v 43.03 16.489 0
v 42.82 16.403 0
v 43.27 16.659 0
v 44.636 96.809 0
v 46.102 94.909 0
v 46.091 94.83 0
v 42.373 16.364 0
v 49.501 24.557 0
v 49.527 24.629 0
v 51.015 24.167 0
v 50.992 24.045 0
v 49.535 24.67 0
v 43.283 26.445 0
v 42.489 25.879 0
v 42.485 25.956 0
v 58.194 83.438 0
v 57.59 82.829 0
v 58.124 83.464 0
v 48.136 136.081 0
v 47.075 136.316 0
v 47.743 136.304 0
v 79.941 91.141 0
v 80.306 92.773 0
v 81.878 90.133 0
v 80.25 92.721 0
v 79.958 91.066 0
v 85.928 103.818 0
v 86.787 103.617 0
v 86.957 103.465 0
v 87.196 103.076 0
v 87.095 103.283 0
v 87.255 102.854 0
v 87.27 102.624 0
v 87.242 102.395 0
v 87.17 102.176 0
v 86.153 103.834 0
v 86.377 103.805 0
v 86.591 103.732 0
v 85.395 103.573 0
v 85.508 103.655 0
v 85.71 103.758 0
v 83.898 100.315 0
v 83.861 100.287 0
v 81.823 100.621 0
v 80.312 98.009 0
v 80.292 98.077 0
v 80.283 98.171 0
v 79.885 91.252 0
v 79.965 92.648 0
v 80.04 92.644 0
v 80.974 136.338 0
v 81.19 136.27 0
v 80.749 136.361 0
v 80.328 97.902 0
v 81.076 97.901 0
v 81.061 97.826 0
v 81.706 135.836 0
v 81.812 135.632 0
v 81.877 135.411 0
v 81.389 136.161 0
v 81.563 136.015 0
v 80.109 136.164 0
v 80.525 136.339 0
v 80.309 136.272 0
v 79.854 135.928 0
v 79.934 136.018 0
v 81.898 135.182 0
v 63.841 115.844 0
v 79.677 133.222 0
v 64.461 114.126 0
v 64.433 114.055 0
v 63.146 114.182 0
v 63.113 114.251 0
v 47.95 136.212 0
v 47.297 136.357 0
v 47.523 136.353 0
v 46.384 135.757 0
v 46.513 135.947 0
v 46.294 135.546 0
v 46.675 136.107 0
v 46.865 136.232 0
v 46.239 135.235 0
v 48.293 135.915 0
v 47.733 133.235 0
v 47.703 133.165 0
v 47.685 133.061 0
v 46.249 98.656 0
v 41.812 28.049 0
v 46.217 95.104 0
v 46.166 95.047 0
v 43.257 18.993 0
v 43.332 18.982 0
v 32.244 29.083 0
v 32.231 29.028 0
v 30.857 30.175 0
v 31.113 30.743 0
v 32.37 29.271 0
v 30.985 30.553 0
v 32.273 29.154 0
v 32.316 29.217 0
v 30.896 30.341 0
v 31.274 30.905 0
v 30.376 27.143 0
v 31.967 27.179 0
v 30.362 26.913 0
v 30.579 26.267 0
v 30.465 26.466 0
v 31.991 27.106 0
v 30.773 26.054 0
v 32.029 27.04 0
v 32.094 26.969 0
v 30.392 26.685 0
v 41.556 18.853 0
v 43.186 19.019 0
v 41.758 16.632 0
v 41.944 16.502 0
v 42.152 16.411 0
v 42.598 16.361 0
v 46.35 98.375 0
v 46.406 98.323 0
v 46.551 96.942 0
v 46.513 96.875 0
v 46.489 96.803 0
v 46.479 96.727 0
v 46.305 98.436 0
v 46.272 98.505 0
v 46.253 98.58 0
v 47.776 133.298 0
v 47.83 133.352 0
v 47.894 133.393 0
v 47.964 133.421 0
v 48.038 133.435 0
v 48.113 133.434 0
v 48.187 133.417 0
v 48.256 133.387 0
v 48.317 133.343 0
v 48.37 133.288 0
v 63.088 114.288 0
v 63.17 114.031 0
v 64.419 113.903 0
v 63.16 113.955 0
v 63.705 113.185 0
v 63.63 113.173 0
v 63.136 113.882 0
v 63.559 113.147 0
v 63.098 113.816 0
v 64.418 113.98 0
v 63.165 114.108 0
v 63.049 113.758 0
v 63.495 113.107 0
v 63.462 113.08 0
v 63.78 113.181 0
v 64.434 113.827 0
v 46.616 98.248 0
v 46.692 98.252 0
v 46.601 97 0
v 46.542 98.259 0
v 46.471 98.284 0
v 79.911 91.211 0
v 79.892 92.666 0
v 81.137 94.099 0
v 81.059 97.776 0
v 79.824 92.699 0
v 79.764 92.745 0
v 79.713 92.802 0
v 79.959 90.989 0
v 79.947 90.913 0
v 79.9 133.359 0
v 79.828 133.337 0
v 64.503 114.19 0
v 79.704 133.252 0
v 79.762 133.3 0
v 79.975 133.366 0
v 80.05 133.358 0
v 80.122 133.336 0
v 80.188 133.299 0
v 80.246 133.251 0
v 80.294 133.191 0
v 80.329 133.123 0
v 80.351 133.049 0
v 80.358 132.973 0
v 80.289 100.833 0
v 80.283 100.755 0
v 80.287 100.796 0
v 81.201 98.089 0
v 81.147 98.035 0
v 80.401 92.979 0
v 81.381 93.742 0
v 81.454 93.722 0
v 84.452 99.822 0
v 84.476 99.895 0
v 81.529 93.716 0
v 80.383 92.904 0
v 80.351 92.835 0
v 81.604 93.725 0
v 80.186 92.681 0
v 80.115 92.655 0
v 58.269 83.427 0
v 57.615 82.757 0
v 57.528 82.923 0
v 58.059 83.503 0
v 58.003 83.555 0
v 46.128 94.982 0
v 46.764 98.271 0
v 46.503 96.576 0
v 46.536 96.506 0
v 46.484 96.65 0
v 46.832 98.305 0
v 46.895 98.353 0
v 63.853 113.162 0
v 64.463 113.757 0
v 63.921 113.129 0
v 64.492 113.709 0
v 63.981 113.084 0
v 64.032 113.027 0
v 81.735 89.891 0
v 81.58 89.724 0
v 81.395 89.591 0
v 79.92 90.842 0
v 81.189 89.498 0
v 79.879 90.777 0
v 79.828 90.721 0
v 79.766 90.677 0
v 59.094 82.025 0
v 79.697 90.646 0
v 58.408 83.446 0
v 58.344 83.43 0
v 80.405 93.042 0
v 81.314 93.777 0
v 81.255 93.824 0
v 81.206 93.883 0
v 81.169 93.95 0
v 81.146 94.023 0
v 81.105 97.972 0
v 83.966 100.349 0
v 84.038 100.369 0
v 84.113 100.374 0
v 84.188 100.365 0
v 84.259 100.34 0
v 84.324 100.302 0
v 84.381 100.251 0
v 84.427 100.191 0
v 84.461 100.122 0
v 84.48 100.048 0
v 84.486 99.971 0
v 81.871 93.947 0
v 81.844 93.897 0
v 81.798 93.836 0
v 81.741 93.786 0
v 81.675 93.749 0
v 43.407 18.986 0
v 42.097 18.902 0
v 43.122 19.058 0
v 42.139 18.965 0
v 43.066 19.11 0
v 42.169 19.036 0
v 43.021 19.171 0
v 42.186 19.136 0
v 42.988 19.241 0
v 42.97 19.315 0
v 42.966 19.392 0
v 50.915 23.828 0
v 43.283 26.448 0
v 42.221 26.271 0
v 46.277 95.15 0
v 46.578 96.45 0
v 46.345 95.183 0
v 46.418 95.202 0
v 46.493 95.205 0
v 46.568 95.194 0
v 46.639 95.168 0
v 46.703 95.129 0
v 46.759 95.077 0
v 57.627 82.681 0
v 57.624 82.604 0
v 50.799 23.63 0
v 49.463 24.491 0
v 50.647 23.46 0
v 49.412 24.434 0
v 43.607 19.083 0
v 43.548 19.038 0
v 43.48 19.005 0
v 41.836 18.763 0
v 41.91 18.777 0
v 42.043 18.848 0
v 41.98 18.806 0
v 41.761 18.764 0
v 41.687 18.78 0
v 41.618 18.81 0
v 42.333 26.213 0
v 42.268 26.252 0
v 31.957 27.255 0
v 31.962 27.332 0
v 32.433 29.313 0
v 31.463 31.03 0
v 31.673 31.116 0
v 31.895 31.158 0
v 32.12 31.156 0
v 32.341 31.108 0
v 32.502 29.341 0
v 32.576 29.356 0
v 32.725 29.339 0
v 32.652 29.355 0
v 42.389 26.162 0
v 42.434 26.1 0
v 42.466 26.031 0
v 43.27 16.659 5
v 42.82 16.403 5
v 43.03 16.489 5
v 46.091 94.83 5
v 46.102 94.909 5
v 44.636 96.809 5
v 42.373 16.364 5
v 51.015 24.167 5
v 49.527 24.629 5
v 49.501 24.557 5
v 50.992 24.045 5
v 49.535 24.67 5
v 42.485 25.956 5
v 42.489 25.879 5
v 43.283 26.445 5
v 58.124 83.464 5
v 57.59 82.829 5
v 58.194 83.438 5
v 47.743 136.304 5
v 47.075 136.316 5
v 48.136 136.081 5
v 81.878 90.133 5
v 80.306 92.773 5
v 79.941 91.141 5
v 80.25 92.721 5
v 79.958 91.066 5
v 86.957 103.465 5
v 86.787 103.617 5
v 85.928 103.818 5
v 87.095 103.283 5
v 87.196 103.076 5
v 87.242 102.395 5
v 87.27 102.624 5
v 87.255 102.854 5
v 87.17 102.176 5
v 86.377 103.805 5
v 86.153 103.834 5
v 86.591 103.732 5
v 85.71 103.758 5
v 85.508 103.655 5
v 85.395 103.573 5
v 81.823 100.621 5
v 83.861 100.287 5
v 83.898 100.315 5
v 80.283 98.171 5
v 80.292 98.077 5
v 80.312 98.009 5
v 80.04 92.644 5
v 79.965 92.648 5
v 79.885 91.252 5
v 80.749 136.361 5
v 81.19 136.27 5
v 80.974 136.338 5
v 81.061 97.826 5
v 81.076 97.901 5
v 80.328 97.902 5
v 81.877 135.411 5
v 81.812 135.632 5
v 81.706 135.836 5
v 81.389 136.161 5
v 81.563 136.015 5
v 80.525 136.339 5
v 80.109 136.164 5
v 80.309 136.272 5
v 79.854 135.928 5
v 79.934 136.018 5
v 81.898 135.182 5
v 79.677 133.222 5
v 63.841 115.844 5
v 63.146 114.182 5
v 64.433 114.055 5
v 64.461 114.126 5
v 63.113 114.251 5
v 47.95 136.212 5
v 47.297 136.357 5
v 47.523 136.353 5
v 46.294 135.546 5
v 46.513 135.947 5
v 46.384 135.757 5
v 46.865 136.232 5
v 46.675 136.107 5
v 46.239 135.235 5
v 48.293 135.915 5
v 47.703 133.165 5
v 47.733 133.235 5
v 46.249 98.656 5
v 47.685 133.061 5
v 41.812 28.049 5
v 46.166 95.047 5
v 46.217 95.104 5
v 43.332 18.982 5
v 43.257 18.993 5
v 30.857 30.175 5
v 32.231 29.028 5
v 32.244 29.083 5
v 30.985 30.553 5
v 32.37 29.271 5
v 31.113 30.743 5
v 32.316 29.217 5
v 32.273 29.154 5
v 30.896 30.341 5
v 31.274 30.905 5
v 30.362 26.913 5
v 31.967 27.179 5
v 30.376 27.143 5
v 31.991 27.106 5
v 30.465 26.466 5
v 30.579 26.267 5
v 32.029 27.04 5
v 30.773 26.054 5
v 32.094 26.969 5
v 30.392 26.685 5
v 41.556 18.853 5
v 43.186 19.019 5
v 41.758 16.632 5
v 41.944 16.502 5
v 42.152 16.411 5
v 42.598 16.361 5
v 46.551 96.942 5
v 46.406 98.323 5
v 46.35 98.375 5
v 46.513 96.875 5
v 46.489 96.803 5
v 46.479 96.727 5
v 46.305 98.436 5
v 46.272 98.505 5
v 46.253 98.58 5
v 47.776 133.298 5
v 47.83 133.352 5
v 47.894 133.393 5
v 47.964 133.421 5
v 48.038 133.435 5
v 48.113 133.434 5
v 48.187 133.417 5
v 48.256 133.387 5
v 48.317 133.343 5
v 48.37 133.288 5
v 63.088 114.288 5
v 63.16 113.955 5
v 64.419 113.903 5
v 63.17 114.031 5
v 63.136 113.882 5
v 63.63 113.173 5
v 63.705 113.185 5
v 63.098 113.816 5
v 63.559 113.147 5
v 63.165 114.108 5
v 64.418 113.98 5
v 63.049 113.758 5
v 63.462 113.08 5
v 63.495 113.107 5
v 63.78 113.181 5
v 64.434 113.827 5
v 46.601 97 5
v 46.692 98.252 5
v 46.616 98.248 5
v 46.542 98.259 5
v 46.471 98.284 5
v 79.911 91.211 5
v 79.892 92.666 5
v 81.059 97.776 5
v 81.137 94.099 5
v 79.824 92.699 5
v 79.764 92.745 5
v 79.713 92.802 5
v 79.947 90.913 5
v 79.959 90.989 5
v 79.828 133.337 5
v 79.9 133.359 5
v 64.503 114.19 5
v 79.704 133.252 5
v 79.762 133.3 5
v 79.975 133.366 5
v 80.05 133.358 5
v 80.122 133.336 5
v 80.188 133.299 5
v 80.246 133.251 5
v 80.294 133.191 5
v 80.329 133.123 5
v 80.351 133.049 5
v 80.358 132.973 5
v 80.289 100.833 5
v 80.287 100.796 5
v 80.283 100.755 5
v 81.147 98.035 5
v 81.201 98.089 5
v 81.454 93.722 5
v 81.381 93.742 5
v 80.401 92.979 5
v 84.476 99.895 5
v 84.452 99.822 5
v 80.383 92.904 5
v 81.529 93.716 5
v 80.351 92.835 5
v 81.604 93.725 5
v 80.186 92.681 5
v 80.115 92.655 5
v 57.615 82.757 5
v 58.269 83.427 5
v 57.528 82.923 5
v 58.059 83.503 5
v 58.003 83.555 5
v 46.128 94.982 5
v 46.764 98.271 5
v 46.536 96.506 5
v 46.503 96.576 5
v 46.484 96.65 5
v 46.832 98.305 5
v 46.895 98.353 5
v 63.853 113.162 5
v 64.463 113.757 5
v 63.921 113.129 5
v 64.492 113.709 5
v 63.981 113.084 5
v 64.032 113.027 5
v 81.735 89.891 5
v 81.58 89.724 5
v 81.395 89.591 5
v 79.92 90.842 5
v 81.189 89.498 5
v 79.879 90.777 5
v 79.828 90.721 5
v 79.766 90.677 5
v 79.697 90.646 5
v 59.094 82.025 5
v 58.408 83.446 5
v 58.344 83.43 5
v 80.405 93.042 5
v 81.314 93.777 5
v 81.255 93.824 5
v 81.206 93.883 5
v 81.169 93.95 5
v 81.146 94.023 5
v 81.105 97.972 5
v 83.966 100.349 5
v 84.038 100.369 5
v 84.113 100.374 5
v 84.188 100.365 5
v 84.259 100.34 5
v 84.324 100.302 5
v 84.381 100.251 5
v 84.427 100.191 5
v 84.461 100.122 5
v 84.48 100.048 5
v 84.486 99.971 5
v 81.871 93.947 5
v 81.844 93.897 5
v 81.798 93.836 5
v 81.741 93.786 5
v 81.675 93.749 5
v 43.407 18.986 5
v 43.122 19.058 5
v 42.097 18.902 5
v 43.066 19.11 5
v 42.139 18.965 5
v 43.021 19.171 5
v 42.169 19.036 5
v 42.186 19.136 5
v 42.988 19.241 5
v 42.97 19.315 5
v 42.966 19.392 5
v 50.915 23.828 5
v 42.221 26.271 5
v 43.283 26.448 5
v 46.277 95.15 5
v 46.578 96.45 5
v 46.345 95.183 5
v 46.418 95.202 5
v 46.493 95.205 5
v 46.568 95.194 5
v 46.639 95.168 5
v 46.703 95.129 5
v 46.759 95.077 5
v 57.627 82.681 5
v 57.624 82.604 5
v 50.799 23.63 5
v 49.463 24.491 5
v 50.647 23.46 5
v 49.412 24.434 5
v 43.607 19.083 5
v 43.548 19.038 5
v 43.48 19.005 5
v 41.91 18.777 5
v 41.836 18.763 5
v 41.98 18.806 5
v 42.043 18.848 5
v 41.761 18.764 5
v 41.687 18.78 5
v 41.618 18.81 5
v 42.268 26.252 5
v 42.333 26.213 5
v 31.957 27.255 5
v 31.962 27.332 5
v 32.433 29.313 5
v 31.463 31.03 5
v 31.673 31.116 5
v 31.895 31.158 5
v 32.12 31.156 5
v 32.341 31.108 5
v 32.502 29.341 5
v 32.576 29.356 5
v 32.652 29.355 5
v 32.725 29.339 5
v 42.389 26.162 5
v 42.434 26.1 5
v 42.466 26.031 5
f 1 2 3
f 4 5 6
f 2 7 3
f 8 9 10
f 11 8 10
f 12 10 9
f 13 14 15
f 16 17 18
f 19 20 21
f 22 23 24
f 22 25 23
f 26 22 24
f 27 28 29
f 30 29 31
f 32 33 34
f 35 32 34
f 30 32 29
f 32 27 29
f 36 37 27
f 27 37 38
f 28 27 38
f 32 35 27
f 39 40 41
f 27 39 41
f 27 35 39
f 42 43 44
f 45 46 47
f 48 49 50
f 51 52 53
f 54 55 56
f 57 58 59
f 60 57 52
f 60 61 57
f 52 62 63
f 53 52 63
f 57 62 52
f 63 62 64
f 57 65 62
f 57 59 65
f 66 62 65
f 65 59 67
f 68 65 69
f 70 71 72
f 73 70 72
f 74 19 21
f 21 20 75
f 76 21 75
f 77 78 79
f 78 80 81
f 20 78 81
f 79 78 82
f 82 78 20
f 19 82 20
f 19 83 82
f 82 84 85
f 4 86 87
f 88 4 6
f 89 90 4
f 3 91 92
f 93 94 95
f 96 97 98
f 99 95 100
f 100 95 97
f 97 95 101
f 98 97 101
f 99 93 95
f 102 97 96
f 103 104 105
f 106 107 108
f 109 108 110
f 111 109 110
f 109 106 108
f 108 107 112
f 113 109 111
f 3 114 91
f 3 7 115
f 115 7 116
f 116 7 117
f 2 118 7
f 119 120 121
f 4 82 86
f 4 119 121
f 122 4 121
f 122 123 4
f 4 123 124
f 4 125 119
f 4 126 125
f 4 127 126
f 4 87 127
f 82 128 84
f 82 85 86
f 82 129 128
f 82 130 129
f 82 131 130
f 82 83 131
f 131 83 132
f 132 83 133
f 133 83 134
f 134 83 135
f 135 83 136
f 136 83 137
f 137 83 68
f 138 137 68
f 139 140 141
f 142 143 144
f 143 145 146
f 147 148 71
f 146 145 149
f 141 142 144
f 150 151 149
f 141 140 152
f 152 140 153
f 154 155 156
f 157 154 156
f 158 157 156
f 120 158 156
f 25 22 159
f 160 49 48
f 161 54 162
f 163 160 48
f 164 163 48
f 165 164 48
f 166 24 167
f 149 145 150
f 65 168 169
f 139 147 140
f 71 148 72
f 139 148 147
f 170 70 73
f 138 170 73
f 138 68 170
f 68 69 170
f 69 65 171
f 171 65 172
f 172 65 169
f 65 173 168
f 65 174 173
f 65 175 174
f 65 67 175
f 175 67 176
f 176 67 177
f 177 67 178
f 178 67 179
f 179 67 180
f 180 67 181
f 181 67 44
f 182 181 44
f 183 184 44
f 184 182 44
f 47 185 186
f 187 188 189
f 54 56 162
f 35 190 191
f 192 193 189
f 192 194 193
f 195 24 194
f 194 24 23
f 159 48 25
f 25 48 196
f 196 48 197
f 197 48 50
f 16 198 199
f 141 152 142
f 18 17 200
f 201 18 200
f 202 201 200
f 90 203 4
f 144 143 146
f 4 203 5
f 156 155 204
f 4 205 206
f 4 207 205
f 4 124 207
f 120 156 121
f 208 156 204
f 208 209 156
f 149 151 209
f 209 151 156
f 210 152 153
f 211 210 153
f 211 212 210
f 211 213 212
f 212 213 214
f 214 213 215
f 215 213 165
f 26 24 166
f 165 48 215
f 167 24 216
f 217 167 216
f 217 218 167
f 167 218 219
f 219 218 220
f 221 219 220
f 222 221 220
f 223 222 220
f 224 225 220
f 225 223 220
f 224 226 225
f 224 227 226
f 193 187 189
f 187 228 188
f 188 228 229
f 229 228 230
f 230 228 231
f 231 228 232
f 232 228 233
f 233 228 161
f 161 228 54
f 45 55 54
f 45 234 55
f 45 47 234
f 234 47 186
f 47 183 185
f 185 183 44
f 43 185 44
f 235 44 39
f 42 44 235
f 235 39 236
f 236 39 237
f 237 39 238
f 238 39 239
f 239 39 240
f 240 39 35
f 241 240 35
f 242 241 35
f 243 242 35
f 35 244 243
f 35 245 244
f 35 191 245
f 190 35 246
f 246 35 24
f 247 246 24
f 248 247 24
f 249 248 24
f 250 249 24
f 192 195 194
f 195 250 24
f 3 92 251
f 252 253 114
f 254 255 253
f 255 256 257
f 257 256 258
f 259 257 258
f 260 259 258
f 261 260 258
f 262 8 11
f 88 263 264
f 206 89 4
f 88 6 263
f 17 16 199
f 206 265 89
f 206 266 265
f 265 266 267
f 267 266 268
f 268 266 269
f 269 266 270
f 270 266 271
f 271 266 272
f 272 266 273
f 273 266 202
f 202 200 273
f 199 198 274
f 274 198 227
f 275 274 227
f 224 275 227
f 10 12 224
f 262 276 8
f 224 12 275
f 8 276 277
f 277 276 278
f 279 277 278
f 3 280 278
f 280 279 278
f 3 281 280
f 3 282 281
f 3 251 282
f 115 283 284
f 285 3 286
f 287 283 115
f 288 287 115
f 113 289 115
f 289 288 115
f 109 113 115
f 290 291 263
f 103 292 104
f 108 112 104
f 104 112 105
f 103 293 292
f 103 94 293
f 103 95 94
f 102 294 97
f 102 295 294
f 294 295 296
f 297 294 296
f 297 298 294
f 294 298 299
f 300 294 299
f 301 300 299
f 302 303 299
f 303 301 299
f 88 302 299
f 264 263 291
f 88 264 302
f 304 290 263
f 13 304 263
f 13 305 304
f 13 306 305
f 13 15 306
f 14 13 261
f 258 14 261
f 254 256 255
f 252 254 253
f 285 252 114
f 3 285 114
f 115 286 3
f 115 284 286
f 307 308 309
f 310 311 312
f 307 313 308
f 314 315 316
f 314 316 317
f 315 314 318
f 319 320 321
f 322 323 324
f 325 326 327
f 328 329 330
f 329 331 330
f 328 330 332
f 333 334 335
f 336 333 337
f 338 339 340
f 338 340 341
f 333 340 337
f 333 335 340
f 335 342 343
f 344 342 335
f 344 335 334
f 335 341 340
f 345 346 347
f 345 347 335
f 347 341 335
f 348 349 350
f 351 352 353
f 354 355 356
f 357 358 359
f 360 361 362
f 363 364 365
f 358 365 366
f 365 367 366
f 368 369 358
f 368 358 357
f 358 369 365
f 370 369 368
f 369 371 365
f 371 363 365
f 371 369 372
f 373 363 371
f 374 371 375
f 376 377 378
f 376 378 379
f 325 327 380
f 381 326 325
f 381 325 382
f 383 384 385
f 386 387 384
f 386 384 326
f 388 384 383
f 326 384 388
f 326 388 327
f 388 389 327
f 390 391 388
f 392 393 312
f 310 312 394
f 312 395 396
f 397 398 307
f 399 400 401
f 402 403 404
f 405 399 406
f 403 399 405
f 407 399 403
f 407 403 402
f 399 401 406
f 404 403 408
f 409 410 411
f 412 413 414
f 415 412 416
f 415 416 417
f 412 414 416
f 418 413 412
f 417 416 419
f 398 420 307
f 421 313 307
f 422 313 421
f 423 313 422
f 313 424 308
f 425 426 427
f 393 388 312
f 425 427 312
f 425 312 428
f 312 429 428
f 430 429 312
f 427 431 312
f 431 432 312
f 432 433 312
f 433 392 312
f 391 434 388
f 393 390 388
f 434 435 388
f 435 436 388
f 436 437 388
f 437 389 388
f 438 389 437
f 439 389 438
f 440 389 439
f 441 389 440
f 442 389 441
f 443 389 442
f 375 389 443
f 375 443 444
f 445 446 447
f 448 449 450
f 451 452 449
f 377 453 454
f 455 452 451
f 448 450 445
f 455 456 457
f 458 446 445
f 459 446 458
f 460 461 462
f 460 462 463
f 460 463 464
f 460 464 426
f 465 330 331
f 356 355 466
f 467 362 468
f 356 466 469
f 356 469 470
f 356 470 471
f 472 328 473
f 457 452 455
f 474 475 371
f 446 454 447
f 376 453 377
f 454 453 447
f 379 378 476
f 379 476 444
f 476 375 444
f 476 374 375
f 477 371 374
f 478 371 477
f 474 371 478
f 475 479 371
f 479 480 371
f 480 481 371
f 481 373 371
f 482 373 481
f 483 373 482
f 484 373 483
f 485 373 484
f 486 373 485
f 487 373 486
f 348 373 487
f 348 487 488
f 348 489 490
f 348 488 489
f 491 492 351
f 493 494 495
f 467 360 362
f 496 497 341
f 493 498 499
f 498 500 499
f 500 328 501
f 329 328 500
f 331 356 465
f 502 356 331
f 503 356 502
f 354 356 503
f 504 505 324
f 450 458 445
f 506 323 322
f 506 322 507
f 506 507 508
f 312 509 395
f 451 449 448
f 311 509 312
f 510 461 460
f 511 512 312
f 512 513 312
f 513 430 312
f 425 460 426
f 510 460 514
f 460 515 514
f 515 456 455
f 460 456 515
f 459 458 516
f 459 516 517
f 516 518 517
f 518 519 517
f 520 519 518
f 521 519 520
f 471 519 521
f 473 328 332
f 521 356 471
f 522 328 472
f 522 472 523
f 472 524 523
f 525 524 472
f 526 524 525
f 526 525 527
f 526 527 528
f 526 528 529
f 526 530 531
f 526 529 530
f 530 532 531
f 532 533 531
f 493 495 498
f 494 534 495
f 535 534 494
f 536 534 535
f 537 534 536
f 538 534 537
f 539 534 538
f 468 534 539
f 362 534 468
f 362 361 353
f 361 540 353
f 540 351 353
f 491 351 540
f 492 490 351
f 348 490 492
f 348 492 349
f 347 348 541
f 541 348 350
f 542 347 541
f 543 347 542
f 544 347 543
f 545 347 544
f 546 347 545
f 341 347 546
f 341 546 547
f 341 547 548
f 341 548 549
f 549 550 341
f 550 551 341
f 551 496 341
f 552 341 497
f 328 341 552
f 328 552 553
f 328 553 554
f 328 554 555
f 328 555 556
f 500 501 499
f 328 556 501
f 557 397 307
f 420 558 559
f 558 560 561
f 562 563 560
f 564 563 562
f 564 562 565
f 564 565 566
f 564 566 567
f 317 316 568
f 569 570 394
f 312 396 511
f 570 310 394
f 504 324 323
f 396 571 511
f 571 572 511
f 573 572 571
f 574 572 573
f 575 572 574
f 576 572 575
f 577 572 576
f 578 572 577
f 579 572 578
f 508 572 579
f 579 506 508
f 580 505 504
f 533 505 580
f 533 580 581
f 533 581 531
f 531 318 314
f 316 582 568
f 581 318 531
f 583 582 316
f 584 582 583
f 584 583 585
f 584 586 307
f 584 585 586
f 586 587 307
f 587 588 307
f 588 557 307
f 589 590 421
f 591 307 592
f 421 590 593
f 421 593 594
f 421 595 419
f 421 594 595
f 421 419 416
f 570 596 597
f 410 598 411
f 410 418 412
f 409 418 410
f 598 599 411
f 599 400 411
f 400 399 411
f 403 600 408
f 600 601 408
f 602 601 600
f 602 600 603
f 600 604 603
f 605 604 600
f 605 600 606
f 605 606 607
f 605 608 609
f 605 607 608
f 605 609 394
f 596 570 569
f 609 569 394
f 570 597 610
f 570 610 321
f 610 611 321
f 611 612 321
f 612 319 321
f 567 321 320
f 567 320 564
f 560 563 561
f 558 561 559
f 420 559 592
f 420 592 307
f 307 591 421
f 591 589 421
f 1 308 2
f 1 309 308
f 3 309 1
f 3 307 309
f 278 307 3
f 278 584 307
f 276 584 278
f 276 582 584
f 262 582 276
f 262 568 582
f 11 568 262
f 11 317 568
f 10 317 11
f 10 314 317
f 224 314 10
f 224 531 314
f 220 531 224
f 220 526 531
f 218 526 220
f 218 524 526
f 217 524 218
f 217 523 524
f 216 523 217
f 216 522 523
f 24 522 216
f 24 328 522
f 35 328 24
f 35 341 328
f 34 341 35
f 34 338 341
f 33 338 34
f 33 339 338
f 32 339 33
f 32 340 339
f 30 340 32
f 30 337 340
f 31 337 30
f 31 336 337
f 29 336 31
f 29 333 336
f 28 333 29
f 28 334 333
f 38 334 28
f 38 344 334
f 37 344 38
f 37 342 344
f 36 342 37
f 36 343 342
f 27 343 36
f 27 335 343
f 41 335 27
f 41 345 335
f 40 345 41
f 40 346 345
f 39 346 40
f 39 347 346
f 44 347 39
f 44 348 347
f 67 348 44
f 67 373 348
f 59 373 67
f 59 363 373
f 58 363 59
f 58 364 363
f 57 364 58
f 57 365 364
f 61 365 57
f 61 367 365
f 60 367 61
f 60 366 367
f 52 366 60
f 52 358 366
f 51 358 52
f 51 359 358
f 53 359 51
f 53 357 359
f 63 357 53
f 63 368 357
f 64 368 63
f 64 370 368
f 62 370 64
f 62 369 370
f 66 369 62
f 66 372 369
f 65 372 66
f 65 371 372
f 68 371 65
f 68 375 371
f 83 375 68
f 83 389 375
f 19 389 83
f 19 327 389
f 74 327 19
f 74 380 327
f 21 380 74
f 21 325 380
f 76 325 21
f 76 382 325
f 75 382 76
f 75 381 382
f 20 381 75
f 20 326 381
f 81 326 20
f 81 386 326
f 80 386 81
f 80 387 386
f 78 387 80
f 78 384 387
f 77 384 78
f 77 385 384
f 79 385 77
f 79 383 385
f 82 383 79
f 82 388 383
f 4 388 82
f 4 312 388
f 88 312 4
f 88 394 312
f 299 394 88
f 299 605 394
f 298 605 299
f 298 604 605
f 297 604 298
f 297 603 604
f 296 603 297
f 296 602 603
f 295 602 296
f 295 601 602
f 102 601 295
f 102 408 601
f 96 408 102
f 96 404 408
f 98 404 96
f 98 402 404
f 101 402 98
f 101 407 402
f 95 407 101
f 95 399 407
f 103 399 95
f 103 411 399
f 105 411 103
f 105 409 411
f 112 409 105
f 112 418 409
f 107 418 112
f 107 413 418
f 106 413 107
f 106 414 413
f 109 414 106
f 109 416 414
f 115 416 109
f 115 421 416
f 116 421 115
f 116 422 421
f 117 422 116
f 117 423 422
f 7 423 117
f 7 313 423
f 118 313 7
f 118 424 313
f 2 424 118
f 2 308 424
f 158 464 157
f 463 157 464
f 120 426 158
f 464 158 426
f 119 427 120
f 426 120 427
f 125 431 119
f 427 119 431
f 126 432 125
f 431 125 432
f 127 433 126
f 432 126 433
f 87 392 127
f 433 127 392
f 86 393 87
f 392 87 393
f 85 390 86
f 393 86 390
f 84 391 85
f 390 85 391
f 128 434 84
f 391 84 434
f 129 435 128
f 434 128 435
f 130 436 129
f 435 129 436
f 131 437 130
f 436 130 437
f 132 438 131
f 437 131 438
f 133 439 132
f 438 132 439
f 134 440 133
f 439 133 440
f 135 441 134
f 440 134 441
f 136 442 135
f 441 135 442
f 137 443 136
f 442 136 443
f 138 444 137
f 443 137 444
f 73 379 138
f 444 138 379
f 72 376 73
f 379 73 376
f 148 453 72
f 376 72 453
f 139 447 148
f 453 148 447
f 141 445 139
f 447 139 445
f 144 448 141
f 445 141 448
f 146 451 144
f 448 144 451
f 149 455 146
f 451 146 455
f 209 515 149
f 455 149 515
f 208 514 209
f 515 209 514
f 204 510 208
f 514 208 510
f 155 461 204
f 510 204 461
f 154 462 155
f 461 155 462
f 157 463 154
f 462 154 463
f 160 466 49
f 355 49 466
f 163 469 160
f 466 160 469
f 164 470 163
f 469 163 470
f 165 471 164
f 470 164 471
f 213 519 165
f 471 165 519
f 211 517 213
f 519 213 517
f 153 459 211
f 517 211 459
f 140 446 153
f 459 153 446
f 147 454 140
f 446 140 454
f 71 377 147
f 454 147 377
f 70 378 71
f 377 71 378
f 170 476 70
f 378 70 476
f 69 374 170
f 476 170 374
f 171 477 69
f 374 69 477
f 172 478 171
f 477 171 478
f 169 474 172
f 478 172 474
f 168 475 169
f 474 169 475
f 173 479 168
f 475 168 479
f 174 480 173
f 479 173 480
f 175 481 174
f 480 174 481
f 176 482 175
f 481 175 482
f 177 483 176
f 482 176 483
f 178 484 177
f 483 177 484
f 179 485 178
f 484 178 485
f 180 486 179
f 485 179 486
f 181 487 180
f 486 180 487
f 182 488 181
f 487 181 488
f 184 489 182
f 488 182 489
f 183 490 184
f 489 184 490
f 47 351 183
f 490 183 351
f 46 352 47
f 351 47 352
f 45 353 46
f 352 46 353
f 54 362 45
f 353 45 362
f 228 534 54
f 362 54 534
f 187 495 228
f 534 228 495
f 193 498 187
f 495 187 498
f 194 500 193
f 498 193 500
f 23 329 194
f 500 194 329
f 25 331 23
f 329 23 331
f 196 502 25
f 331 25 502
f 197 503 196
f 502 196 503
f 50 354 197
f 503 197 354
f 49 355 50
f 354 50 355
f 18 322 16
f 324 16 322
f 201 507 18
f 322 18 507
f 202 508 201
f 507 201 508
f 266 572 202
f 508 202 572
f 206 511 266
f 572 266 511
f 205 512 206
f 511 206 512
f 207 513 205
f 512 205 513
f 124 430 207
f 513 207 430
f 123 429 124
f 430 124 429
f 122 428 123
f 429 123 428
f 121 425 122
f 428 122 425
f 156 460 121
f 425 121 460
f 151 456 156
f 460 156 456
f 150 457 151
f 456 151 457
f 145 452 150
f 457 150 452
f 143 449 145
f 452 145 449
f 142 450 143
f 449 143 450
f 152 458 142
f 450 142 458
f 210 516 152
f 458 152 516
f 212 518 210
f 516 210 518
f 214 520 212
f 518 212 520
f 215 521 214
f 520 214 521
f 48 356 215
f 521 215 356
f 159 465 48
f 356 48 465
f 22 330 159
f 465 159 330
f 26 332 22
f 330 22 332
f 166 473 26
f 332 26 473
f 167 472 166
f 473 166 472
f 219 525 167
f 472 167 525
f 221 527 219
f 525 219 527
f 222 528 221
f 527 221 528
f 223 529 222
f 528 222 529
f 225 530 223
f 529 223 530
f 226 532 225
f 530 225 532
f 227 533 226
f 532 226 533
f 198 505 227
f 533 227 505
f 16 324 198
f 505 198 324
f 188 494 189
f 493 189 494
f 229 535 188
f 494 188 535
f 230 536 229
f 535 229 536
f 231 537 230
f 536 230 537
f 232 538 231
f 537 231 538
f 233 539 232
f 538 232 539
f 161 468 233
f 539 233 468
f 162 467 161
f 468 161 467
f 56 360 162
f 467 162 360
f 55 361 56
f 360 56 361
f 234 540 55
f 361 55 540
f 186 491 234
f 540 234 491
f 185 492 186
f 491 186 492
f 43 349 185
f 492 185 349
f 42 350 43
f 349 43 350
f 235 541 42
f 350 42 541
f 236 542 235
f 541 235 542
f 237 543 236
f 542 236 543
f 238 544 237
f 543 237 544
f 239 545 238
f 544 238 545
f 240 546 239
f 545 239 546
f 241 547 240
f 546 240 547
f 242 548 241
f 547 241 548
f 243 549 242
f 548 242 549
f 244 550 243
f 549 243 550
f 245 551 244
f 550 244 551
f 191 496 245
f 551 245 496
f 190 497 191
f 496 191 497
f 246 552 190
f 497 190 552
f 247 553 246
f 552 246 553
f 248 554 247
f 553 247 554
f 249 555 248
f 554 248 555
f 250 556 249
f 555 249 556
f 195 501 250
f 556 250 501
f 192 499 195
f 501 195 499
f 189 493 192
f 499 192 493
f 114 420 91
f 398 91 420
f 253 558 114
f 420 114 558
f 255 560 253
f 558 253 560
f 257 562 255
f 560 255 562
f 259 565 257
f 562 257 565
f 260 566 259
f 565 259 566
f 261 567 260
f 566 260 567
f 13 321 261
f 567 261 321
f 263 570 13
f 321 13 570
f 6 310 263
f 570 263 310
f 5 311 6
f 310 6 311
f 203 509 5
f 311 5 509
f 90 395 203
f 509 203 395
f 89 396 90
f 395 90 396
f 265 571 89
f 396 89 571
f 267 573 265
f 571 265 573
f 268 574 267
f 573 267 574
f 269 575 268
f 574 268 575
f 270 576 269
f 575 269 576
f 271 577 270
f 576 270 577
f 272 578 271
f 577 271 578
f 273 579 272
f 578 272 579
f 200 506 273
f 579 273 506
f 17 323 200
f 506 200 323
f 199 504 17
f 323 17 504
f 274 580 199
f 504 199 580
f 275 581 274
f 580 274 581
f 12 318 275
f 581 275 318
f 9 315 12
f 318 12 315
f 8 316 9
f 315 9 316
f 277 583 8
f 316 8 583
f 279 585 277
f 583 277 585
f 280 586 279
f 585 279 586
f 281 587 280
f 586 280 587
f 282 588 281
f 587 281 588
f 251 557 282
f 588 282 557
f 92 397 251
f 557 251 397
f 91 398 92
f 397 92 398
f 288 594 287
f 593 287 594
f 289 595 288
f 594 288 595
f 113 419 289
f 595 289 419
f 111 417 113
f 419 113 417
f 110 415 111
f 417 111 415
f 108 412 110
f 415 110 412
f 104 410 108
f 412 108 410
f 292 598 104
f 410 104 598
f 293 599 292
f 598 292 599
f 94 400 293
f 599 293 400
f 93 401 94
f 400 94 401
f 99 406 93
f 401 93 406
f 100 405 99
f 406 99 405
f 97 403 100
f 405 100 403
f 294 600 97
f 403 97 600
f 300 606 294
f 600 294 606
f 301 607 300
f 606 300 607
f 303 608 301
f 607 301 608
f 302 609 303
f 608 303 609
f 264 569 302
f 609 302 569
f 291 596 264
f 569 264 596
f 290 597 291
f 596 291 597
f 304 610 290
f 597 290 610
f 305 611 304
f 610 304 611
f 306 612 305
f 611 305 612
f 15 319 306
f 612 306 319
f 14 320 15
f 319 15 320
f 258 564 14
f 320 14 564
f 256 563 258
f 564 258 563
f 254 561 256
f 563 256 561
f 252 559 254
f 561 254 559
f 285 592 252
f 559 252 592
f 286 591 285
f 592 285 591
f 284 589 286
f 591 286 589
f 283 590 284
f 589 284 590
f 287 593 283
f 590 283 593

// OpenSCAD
/*
 * Customizable Origami - Giraffe - https://www.thingiverse.com/thing:2735802
 * by Dennis Hofmann - https://www.thingiverse.com/mightynozzle/about
 * created 2017-12-28
 * version v1.0
 *
 * Changelog
 * --------------
 * v1.0:
 *      - final design
 * --------------
 * 
 * This work is licensed under the Creative Commons - Attribution - NonCommercial - ShareAlike license.
 * https://creativecommons.org/licenses/by-nc-sa/3.0/
 */


 // Parameter Section //
//-------------------//

// preview[view:north, tilt:top]

// The maximum size of the longest side. The shorter side will be automatically resized in same ratio.
max_size_in_millimeter = 120; //[20:300]

// The height of the model.
model_height_in_millimeter = 5; //[0.2:0.2:100]

// Thickness of the outer outline.
outline_size_in_millimeter = 1.6; //[0.5:0.1:20]

// Thickness of the inner outline.
inline_size_in_millimeter = 0.8; //[0.5:0.1:20]

// Roundiness of the ends of the inner outlines.
inline_edge_radius_in_millimeter = 0.4; //[0.0:0.1:5]

// Flip model
flip_model = "no"; //[yes,no]

/*[hidden]*/
max_size = max_size_in_millimeter;
model_height = model_height_in_millimeter;
$fn=32;

// Outer Points
A1 = [393, 329];
A2 = [530, 214];
A3 = [622, 297];
A4 = [724, 1012];
A5 = [1008, 1106];
A6 = [1006, 1230];
A7 = [1074, 1253];
A8 = [1006, 1198];
A9 = [1007, 1650];
A10 = [796, 1391];
A11 = [591, 1650];
A12 = [571, 1181];
A13 = [535, 323];
A14 = [399, 366];

outline = [A1, A2, A3, A4, A5, A7, A8, A9, A10, A11, A12, A13, A14];

// Polygons
C1 = [A1, A2, A13, A14];
C2 = [A2, A3, A4, A12, A13];
C3 = [A4, A5, A10, A12];
C4 = [A5, A6, A8, A9, A10];
C5 = [A10, A12, A11];
C6 = [A5, A7, A8];

cut_polygons = [C1, C2, C3, C4, C5, C6];

min_x = A1[0];
min_y = A2[1];
max_x = A7[0];
max_y = A11[1];

x_size = max_x - min_x;
y_size = max_y - min_y;

x_factor = max_size / x_size;
y_factor = max_size / y_size;

inline_size = x_size > y_size ? inline_size_in_millimeter / x_factor / 2: inline_size_in_millimeter / y_factor / 2;
inline_edge_radius = x_size > y_size ? inline_edge_radius_in_millimeter / x_factor: inline_edge_radius_in_millimeter / y_factor;
outline_size = x_size > y_size ? outline_size_in_millimeter / x_factor - inline_size: outline_size_in_millimeter / y_factor - inline_size;


 // Program Section //
//-----------------//

if(x_size > y_size) {
    resize(newsize=[max_size, x_factor * y_size, model_height]){
        if(flip_model == "yes") {
            mirror([0,1,0]) {
                rotate([180,180,0]) {    
                    create(outline, cut_polygons);
                }
            }
        } else {
            create(outline, cut_polygons);
        }
    }
} else {
    resize(newsize=[y_factor * x_size, max_size, model_height]){
        if(flip_model == "yes") {
            mirror([0,1,0]) {
                rotate([180,180,0]) {    
                    create(outline, cut_polygons);
                }
            }
        } else {
            create(outline, cut_polygons);
        }
    }
}


 // Module Section //
//----------------//

module create() {
    linear_extrude(height=1) {
        difference() {
            offset(r = -0) {
                offset(r = +outline_size) {
                    polygon(points = outline, convexity = 10);
                }
            }
            
            for(cut_polygon = [0:len(cut_polygons)]) {
                offset(r = +inline_edge_radius) {
                    offset(r = -inline_size - inline_edge_radius) {
                        polygon(points = cut_polygons[cut_polygon], convexity = 10);
                    }
                }
            }
        }
    }
}
